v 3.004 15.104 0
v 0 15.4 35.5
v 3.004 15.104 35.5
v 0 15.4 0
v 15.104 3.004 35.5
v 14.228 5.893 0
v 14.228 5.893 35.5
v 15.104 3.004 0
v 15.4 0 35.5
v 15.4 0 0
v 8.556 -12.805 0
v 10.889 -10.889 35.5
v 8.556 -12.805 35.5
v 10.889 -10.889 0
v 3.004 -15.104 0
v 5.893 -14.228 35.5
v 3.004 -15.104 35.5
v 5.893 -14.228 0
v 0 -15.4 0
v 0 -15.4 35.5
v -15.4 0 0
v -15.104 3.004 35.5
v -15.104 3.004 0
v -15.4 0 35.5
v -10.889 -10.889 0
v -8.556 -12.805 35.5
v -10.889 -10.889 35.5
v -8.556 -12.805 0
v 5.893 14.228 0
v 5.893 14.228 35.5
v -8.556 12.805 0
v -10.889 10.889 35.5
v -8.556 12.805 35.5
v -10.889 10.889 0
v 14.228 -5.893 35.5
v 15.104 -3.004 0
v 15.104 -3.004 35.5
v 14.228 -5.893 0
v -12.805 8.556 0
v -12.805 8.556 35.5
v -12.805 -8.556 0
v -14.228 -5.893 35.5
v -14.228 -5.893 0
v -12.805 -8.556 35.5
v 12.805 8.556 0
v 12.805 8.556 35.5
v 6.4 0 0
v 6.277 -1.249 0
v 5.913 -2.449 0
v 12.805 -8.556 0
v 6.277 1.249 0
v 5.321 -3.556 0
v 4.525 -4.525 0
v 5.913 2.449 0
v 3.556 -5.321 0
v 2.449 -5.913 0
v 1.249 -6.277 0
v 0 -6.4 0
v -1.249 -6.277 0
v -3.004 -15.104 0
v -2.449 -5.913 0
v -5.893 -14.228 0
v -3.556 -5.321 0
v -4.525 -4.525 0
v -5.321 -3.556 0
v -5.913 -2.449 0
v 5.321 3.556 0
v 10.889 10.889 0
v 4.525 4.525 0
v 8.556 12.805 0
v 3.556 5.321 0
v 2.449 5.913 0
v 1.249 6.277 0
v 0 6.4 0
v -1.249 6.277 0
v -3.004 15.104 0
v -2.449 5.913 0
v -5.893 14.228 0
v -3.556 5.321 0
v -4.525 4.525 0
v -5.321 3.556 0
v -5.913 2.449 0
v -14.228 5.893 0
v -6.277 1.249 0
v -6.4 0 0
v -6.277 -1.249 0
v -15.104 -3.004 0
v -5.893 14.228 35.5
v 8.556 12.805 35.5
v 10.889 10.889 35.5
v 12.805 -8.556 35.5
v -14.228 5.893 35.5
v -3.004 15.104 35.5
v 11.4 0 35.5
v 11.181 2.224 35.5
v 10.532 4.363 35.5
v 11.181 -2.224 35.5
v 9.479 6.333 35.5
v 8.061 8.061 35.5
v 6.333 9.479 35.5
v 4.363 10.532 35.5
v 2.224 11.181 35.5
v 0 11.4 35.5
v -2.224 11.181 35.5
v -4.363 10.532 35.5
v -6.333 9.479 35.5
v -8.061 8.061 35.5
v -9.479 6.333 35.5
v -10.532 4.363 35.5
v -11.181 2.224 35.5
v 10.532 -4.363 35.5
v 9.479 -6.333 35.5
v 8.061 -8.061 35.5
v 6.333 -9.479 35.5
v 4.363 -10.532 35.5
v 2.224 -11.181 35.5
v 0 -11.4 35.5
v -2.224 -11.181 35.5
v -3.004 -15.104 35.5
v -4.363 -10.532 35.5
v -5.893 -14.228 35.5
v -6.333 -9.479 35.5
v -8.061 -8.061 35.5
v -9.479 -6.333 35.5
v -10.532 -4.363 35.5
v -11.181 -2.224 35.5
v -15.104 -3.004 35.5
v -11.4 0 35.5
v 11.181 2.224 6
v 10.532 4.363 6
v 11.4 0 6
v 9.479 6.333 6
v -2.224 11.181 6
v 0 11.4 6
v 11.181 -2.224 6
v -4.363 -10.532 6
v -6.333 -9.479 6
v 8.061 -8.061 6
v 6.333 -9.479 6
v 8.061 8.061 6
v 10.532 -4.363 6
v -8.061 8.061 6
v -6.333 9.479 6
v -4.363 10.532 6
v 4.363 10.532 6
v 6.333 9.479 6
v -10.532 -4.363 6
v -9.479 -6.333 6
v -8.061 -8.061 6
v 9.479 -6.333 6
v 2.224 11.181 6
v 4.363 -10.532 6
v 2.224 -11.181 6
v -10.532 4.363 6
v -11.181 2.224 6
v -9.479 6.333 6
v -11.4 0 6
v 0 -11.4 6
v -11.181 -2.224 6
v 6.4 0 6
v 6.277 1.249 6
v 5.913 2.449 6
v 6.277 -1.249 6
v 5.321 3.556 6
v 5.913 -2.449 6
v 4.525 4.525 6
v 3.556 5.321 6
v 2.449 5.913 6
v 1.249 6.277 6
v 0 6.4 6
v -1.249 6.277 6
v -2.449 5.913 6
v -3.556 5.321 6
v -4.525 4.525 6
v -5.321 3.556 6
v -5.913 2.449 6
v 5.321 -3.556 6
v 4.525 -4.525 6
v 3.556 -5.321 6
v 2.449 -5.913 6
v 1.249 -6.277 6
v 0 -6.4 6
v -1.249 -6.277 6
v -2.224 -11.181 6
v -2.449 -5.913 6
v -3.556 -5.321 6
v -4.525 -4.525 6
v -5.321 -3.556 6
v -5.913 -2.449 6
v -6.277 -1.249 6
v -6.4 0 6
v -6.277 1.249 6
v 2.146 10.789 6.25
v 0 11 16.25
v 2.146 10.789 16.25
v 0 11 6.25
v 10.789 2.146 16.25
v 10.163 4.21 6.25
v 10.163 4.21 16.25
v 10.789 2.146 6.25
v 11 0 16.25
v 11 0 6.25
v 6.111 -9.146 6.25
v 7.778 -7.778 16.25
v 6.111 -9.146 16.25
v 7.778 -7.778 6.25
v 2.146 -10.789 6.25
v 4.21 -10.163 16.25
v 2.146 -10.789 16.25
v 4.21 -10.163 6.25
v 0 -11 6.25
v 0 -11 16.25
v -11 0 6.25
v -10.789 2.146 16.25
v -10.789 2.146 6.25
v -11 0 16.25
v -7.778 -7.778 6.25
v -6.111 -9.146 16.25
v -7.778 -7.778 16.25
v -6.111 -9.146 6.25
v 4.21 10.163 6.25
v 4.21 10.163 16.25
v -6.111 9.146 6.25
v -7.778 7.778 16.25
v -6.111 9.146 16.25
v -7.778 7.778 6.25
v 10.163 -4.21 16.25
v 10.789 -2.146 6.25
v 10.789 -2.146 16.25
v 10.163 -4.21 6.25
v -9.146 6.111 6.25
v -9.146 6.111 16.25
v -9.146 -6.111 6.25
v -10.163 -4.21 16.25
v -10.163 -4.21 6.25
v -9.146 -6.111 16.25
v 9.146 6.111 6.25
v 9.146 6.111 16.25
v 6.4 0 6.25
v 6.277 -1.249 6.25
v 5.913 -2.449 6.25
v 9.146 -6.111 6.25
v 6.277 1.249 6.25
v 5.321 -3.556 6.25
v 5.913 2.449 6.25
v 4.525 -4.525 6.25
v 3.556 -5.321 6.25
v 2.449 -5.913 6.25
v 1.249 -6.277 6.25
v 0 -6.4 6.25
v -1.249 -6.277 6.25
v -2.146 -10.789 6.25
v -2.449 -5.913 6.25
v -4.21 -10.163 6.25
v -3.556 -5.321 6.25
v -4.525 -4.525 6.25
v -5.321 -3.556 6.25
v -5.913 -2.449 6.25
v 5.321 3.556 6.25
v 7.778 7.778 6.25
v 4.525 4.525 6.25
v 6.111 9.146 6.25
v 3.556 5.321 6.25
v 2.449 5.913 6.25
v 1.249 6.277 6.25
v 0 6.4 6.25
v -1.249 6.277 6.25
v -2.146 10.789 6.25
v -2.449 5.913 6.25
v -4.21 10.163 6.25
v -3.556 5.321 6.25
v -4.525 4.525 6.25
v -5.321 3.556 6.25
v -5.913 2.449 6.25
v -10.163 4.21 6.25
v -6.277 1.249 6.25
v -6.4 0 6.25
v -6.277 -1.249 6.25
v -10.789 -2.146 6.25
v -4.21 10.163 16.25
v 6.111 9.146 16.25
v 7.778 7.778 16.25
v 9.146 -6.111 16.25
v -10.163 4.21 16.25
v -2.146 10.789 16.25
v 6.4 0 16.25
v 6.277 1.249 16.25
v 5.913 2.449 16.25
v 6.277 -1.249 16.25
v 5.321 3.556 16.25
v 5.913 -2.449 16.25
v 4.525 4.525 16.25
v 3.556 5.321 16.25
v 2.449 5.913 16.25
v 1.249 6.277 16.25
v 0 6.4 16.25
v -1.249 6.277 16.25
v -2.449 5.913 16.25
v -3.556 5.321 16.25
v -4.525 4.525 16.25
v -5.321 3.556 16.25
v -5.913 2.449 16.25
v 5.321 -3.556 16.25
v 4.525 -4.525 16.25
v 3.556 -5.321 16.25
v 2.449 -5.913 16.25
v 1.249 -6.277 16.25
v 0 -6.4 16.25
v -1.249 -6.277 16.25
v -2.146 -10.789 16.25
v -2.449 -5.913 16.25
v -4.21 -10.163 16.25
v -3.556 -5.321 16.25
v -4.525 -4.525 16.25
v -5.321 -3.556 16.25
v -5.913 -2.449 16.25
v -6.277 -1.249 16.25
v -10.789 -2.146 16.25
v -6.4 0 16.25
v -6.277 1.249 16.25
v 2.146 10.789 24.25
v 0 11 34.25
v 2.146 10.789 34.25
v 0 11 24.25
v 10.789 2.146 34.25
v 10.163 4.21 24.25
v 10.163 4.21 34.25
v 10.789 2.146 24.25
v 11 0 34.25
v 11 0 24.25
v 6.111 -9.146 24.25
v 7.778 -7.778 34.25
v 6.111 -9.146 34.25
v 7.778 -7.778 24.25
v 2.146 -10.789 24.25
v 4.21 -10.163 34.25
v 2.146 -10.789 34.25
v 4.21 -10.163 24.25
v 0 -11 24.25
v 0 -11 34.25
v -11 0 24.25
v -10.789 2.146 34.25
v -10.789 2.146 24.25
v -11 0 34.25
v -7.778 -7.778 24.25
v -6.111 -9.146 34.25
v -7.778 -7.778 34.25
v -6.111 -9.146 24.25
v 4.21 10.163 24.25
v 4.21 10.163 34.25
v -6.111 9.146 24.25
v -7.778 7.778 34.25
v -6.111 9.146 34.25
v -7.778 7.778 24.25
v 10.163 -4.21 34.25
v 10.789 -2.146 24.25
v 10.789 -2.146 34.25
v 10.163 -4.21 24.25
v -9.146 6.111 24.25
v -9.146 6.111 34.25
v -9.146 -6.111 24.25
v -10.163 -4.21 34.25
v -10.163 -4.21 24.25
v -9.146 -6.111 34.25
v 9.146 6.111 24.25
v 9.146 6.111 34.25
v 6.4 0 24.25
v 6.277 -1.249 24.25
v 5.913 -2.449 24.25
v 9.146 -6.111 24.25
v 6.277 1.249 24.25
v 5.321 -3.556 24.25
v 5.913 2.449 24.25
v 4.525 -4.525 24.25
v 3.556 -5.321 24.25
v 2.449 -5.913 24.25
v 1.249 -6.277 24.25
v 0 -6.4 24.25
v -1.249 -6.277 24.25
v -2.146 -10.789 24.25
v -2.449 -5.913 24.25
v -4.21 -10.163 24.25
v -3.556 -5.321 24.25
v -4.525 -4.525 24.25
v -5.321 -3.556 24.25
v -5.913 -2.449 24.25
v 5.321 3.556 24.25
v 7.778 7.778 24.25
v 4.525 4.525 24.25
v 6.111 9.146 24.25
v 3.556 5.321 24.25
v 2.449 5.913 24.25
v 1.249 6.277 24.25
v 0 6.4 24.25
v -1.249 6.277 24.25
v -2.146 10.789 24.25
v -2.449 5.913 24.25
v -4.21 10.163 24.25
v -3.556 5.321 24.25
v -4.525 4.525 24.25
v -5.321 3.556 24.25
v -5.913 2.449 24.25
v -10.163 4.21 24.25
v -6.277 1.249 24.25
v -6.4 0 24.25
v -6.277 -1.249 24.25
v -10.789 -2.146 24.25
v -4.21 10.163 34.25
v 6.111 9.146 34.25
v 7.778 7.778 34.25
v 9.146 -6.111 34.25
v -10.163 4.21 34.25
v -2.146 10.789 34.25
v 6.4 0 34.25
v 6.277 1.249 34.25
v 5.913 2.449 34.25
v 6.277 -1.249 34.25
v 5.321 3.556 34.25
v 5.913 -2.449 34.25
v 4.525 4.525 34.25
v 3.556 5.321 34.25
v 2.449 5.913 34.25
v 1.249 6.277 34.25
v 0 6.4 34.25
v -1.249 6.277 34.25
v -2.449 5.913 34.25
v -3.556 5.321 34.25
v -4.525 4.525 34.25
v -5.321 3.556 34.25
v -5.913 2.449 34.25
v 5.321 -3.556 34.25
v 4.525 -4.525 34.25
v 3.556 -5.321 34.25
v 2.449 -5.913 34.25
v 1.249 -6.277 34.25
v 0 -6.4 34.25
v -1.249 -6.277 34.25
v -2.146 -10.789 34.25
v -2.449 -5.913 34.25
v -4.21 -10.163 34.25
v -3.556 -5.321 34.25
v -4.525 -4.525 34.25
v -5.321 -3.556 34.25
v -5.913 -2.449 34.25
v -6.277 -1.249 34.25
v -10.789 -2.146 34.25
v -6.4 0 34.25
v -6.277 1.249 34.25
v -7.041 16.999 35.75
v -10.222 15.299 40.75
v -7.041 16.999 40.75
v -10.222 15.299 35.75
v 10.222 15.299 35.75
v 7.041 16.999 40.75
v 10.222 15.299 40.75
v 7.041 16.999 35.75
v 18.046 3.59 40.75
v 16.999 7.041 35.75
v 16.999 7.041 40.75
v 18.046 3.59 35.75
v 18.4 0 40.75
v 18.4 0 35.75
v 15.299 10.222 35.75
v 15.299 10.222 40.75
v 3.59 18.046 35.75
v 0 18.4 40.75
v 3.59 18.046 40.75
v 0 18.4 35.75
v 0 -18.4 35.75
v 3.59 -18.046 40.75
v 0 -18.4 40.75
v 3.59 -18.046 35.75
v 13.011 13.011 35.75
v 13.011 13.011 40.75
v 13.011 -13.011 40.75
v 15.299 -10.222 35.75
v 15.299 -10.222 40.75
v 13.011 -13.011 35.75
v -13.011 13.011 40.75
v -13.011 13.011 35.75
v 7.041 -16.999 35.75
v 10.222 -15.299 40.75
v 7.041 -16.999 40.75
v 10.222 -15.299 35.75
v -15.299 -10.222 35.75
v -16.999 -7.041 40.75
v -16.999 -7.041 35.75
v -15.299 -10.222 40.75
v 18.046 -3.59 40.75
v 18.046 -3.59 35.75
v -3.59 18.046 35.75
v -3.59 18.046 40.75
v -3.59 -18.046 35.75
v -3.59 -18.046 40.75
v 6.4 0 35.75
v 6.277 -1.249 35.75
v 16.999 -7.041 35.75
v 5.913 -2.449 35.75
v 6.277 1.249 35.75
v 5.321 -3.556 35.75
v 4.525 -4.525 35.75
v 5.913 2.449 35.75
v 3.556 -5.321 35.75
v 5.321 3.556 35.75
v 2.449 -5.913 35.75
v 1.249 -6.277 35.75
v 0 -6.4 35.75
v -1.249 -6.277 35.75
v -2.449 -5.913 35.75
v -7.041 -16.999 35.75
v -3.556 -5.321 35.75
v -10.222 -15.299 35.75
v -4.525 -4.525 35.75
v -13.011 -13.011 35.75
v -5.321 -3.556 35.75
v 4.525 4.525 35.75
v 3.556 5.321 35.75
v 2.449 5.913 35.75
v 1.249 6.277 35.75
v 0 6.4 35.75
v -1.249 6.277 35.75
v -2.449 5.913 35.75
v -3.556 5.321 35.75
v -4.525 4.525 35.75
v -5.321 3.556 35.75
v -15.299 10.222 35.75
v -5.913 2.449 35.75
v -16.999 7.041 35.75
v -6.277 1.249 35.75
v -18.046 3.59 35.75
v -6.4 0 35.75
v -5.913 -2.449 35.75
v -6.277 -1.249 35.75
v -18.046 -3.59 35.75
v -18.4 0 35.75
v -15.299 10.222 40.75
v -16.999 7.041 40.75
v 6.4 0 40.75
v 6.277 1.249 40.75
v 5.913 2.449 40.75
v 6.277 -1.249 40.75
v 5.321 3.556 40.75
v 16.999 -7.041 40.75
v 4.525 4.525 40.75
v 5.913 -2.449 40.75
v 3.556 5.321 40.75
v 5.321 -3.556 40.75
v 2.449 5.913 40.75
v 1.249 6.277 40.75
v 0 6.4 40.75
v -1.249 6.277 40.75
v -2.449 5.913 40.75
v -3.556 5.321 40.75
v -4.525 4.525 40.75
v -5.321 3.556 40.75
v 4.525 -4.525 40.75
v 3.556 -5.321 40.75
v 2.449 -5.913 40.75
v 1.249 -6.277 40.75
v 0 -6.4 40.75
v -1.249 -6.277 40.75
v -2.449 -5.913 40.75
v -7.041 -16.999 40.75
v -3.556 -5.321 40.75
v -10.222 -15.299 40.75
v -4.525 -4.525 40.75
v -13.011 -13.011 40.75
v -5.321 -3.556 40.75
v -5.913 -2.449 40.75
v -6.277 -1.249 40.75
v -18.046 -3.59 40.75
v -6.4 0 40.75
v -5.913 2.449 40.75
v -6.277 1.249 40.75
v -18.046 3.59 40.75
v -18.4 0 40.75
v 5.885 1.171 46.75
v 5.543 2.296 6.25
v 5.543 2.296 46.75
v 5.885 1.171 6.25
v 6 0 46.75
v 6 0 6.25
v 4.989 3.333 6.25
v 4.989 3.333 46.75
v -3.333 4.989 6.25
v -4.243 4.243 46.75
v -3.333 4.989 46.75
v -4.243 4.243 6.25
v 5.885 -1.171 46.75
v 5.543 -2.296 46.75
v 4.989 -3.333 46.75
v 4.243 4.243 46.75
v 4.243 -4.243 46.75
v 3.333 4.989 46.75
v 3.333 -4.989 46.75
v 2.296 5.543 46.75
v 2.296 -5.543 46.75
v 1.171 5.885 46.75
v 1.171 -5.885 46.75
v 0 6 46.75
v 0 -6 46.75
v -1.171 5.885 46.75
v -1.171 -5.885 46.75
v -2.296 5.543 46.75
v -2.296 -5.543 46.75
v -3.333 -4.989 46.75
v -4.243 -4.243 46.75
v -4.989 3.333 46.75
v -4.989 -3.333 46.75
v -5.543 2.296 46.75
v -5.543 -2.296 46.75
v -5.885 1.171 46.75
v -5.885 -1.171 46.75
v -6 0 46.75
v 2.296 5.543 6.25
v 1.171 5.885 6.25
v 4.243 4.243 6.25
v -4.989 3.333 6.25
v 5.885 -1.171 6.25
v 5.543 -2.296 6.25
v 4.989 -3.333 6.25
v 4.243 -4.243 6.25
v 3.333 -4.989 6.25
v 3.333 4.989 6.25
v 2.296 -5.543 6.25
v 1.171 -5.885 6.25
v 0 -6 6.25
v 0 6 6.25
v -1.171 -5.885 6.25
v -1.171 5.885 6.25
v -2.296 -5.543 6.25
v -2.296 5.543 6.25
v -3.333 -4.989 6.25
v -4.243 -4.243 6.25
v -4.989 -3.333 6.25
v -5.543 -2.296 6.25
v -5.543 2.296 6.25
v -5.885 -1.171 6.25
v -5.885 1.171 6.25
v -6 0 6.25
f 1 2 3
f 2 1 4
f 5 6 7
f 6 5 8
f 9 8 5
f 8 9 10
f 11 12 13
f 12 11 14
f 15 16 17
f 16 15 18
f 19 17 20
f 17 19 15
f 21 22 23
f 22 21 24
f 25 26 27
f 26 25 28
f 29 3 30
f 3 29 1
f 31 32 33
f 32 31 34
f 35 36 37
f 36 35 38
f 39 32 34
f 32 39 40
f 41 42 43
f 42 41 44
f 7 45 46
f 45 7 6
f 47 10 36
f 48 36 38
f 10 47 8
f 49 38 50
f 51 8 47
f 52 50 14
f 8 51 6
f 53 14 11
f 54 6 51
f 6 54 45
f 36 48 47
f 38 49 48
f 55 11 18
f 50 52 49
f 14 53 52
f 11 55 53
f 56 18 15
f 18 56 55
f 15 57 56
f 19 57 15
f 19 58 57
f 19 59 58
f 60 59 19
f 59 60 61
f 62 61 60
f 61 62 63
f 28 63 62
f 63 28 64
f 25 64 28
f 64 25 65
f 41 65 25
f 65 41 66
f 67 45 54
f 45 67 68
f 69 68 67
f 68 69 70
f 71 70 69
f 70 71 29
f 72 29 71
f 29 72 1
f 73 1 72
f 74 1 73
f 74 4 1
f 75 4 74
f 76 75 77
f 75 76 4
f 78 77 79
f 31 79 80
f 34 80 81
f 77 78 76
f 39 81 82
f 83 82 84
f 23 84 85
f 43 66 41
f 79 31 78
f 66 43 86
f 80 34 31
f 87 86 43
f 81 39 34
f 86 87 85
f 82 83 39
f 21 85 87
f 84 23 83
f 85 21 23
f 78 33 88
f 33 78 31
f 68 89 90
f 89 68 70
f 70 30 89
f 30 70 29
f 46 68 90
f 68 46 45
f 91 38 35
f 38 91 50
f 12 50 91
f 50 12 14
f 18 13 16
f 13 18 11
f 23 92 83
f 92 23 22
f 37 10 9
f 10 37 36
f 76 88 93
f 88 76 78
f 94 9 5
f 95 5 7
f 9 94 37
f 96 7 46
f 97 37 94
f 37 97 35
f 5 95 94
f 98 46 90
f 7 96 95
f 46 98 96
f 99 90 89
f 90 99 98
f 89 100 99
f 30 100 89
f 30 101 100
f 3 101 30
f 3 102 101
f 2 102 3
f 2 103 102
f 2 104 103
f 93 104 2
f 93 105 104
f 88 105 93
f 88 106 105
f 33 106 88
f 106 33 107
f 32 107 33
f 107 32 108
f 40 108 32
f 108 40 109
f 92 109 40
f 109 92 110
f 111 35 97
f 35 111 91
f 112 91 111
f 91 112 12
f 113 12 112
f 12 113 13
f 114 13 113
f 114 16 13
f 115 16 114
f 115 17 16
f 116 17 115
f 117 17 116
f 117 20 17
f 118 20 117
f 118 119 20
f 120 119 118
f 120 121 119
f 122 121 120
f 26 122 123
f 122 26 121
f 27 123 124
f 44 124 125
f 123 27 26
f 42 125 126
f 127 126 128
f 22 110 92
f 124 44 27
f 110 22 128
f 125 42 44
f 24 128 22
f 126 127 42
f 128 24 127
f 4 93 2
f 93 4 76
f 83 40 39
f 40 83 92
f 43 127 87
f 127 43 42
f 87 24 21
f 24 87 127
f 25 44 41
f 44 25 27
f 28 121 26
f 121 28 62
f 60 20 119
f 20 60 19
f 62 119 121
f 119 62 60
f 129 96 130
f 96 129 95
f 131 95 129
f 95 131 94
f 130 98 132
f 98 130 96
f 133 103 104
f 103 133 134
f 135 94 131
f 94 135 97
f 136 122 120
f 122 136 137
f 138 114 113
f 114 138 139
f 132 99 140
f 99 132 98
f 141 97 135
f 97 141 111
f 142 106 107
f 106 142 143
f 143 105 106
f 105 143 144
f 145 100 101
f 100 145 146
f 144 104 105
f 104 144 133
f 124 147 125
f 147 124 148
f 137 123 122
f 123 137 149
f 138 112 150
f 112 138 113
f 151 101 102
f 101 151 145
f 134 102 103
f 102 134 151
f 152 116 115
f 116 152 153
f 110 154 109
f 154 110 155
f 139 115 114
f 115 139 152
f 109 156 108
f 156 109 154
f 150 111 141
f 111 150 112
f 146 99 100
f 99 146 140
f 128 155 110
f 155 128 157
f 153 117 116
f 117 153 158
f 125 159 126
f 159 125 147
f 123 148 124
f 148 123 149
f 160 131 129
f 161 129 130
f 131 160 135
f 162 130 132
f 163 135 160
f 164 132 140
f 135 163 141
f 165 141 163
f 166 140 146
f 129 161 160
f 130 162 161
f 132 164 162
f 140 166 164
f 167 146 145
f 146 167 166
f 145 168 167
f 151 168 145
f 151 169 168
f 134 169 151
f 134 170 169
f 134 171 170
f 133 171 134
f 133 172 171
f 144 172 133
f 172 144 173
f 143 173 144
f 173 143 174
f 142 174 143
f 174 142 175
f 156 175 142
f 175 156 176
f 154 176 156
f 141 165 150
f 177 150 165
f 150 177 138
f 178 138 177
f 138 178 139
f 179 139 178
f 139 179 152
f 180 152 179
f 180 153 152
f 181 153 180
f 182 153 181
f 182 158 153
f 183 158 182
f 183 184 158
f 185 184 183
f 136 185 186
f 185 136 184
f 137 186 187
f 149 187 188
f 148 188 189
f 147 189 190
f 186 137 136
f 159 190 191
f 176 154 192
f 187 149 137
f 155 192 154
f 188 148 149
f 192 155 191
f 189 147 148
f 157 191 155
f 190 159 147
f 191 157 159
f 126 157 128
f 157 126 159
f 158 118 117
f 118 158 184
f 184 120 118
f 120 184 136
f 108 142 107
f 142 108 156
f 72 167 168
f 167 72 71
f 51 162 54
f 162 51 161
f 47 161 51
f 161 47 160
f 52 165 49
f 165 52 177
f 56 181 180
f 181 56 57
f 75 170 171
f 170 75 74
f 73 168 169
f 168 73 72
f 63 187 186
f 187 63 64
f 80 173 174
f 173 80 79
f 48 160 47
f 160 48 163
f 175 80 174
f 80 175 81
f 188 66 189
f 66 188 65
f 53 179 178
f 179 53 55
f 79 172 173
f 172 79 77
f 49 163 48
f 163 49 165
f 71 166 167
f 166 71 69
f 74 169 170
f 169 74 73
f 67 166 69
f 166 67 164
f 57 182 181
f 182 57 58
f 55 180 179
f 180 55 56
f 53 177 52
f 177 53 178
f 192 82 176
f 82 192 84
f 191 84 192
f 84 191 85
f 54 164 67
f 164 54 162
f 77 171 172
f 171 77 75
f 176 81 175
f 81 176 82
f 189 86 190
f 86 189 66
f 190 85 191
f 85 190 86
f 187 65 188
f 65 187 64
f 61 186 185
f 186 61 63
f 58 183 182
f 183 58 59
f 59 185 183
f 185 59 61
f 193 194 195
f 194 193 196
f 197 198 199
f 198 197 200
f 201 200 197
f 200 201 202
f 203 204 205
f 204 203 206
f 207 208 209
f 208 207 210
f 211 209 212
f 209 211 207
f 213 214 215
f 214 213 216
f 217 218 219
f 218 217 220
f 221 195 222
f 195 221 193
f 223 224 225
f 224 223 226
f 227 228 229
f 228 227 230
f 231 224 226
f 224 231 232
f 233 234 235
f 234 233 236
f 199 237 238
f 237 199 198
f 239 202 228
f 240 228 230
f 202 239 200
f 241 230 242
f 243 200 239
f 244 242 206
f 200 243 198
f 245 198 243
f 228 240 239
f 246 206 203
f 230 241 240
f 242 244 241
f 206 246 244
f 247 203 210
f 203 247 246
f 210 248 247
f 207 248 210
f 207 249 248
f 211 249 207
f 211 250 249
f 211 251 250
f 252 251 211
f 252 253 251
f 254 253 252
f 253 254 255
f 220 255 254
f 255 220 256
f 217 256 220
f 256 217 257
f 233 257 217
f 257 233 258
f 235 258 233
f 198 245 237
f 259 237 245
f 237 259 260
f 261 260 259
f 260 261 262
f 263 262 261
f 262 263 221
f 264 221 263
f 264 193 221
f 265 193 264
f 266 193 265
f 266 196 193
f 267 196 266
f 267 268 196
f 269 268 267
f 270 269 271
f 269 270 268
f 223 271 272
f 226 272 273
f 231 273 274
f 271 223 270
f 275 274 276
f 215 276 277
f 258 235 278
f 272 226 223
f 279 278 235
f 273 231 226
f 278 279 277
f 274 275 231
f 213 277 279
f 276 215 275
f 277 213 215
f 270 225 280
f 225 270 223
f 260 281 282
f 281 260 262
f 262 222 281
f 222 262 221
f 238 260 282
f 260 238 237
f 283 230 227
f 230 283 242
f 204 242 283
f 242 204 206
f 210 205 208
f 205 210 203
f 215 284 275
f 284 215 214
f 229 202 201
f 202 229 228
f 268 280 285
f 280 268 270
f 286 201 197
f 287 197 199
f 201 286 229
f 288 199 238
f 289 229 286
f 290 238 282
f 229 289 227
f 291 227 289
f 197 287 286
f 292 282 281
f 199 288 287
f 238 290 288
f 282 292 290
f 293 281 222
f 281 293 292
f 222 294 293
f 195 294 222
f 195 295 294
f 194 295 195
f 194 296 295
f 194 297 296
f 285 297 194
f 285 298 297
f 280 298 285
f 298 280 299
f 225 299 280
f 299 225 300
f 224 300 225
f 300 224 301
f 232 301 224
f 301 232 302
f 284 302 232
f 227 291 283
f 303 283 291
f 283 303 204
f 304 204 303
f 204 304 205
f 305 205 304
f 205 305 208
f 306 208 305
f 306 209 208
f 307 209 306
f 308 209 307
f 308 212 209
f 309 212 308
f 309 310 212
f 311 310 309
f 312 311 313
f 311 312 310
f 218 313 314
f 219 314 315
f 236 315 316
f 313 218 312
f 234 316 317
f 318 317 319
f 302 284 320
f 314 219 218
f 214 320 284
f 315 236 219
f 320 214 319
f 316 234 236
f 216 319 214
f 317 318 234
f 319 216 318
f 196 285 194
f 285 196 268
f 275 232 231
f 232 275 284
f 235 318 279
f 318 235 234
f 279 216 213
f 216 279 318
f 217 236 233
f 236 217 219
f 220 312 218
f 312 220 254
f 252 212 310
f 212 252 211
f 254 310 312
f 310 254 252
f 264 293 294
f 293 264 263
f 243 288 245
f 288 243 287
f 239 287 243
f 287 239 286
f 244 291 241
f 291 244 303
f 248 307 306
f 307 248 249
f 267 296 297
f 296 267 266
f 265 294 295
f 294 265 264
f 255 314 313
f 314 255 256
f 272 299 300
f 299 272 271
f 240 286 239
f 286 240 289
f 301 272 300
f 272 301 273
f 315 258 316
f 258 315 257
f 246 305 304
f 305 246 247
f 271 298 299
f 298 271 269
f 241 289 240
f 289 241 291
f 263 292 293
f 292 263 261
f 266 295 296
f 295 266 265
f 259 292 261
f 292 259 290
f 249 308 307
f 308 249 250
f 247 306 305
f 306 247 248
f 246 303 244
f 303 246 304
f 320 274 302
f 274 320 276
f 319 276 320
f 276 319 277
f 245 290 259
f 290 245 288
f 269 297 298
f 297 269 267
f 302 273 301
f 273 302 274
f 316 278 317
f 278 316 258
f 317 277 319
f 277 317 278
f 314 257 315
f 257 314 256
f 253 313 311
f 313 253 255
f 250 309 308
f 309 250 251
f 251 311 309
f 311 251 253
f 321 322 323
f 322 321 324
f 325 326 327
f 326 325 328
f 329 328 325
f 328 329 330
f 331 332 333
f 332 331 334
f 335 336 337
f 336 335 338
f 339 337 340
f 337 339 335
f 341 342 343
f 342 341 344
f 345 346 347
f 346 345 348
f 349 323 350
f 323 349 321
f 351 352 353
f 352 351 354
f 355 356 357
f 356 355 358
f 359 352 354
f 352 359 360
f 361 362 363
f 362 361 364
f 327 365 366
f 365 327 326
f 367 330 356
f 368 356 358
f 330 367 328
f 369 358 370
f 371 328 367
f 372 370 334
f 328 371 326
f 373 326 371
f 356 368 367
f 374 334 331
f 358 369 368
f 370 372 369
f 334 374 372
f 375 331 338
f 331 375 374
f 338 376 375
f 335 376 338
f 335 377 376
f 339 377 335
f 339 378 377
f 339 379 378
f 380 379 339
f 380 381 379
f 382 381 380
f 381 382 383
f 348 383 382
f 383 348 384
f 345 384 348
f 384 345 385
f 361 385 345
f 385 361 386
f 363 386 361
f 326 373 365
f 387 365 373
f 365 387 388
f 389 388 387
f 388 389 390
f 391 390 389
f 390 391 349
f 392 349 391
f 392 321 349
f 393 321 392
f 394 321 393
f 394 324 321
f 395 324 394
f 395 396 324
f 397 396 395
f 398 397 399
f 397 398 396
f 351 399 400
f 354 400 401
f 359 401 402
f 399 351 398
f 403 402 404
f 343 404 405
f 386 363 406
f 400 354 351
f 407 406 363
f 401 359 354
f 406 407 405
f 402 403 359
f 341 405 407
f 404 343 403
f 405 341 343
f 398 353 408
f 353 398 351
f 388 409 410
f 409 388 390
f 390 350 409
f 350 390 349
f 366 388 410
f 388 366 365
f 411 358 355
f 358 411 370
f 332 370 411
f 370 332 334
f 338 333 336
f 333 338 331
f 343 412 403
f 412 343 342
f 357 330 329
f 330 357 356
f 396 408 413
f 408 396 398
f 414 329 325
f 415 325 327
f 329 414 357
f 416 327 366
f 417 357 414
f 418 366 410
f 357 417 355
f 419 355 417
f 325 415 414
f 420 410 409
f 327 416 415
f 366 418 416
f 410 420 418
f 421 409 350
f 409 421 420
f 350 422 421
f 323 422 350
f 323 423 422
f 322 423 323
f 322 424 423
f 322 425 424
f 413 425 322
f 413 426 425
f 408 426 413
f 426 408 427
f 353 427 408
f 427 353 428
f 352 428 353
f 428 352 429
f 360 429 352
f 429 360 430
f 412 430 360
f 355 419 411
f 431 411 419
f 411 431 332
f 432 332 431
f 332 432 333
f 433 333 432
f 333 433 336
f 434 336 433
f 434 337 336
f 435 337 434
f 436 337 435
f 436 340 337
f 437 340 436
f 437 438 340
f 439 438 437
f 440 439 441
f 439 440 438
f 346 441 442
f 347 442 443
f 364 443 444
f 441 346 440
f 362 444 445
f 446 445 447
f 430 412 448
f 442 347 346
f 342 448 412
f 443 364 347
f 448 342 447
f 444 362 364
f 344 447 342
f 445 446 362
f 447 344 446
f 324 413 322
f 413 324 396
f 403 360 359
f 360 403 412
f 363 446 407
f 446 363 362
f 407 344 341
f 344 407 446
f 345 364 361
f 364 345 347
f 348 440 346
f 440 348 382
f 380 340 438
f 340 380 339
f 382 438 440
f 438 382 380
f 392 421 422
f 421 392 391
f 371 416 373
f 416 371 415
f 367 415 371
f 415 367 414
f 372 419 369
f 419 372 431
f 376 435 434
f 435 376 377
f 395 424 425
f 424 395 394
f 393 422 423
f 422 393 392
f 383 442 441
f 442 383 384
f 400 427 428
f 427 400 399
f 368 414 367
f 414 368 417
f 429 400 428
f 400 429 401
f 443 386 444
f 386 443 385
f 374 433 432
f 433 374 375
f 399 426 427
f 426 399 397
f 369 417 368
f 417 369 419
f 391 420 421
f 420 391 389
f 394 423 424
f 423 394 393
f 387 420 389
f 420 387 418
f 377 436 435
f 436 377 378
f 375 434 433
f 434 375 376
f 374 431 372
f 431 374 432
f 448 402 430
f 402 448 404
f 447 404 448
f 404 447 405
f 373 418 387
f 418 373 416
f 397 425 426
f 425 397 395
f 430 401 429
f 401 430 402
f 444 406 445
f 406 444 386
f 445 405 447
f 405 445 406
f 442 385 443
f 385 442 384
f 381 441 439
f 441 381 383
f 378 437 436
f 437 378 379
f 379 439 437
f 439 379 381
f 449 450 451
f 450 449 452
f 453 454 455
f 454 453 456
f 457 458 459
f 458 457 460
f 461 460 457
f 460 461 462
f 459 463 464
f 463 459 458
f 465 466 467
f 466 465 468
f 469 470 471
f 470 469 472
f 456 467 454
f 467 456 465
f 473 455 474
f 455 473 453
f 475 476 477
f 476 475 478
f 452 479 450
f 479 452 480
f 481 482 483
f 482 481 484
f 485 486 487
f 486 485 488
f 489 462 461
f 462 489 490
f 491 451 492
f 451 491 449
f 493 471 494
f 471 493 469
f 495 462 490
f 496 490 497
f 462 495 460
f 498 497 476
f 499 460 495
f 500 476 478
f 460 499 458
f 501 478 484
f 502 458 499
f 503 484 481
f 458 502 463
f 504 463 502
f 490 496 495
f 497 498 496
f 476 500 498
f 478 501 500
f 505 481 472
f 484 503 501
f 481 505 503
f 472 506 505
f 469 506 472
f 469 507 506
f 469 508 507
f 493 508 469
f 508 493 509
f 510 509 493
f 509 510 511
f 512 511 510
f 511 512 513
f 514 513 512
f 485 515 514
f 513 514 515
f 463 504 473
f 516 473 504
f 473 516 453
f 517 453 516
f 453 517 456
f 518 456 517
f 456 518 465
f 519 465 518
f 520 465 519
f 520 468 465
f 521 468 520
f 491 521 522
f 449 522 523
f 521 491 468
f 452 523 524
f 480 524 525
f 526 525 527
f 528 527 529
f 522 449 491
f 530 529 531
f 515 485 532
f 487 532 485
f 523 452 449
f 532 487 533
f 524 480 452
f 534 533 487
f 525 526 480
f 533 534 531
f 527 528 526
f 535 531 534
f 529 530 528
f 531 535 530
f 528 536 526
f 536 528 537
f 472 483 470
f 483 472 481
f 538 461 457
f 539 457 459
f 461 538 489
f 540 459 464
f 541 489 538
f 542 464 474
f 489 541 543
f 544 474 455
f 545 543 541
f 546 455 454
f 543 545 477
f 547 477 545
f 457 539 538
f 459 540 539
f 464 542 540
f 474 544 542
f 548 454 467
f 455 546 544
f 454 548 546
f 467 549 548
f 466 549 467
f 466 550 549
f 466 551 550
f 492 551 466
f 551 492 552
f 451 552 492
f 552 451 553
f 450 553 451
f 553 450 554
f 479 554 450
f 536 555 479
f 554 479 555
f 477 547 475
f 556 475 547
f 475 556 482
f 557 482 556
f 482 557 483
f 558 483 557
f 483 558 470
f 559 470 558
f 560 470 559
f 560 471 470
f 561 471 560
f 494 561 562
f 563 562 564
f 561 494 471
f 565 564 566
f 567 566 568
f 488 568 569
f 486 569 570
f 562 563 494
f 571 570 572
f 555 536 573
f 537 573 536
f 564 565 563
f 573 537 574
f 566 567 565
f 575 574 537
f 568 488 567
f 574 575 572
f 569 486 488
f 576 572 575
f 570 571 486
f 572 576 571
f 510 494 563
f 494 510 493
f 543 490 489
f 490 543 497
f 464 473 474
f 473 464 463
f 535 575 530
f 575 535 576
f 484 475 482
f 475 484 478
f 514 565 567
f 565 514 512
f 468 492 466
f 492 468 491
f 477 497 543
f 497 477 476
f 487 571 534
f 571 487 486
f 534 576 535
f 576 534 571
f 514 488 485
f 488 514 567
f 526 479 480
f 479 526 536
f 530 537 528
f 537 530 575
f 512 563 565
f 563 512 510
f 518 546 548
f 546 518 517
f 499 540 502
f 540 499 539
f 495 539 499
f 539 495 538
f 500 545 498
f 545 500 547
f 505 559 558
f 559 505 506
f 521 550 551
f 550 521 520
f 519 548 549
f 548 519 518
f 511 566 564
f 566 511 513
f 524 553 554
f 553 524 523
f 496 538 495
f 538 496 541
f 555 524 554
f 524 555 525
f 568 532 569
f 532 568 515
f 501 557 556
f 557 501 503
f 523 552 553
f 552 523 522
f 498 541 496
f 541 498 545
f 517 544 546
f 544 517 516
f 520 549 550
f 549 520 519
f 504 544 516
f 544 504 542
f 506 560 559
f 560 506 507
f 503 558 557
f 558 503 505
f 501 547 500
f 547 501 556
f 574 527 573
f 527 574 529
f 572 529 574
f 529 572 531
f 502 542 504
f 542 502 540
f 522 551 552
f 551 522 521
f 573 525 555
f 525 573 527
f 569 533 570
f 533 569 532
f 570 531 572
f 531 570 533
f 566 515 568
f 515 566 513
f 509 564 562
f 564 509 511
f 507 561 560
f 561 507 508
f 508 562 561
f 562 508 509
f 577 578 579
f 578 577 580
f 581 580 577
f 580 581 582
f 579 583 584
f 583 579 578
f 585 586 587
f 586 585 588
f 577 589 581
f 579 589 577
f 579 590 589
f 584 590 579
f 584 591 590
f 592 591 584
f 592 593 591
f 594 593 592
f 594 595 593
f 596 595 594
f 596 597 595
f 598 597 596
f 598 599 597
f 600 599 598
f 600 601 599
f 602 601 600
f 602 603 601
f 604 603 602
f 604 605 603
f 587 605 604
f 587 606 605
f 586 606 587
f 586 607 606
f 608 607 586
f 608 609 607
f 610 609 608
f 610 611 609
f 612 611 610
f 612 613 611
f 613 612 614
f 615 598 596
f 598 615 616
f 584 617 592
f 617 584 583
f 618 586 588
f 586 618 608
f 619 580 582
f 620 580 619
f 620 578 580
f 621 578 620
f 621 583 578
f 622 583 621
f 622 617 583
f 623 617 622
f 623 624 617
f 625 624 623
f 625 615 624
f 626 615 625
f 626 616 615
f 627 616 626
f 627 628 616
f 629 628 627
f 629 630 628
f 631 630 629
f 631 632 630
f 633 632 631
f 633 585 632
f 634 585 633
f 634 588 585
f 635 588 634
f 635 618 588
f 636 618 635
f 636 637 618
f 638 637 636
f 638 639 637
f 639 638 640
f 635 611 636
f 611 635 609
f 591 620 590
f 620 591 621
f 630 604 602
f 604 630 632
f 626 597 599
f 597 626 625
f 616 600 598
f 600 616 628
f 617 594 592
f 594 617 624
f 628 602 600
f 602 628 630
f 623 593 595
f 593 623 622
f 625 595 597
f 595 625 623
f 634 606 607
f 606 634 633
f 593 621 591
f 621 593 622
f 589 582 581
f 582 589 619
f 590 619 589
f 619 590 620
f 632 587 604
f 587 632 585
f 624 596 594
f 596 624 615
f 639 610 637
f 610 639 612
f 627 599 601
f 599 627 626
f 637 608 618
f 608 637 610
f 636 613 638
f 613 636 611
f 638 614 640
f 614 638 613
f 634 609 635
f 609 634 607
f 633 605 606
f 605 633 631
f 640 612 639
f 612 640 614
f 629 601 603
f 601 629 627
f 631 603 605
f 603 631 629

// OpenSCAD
$fn = 32;

// ------------------------------------------------------------------------
// Shaft station: cup d30.8 x 35.5 mm, shaft d12
// Every part is its own module, assembly() places every instance.
// ------------------------------------------------------------------------

// --- part 1 ---
module housing_cup() {
  difference() {
    cylinder(h = 35.5, d = 30.8);
    translate([0, 0, 6]) cylinder(h = 30.5, d = 22.8);
    translate([0, 0, -1]) cylinder(h = 8, d = 12.8);
  }
}

// --- part 2 ---
module bearing_lower() {
  difference() {
      translate([0, 0, 0]) cylinder(h = 10, d = 22);
      translate([0, 0, -1]) cylinder(h = 12, d = 12.8);
    }
}

// --- part 3 ---
module bearing_upper() {
  difference() {
      translate([0, 0, 0]) cylinder(h = 10, d = 22);
      translate([0, 0, -1]) cylinder(h = 12, d = 12.8);
    }
}

// --- part 4 ---
module station_shaft() {
  translate([0, 0, -20.25]) cylinder(h = 40.5, d = 12);
}

// --- part 5 ---
module station_cover() {
  difference() {
    cylinder(h = 5, d = 36.8);
    translate([0, 0, -1]) cylinder(h = 7, d = 12.8);
  }
}

// --- assembly ---
module assembly() {
  color([0.80, 0.24, 0.20]) translate([0, 0, 0]) rotate([0, 0, 0]) housing_cup();
  color([0.20, 0.45, 0.75]) translate([0, 0, 6.25]) rotate([0, 0, 0]) bearing_lower();
  color([0.25, 0.62, 0.32]) translate([0, 0, 24.25]) rotate([0, 0, 0]) bearing_upper();
  color([0.92, 0.70, 0.18]) translate([0, 0, 26.5]) rotate([0, 0, 0]) station_shaft();
  color([0.58, 0.35, 0.70]) translate([0, 0, 35.75]) rotate([0, 0, 0]) station_cover();
}

assembly();
